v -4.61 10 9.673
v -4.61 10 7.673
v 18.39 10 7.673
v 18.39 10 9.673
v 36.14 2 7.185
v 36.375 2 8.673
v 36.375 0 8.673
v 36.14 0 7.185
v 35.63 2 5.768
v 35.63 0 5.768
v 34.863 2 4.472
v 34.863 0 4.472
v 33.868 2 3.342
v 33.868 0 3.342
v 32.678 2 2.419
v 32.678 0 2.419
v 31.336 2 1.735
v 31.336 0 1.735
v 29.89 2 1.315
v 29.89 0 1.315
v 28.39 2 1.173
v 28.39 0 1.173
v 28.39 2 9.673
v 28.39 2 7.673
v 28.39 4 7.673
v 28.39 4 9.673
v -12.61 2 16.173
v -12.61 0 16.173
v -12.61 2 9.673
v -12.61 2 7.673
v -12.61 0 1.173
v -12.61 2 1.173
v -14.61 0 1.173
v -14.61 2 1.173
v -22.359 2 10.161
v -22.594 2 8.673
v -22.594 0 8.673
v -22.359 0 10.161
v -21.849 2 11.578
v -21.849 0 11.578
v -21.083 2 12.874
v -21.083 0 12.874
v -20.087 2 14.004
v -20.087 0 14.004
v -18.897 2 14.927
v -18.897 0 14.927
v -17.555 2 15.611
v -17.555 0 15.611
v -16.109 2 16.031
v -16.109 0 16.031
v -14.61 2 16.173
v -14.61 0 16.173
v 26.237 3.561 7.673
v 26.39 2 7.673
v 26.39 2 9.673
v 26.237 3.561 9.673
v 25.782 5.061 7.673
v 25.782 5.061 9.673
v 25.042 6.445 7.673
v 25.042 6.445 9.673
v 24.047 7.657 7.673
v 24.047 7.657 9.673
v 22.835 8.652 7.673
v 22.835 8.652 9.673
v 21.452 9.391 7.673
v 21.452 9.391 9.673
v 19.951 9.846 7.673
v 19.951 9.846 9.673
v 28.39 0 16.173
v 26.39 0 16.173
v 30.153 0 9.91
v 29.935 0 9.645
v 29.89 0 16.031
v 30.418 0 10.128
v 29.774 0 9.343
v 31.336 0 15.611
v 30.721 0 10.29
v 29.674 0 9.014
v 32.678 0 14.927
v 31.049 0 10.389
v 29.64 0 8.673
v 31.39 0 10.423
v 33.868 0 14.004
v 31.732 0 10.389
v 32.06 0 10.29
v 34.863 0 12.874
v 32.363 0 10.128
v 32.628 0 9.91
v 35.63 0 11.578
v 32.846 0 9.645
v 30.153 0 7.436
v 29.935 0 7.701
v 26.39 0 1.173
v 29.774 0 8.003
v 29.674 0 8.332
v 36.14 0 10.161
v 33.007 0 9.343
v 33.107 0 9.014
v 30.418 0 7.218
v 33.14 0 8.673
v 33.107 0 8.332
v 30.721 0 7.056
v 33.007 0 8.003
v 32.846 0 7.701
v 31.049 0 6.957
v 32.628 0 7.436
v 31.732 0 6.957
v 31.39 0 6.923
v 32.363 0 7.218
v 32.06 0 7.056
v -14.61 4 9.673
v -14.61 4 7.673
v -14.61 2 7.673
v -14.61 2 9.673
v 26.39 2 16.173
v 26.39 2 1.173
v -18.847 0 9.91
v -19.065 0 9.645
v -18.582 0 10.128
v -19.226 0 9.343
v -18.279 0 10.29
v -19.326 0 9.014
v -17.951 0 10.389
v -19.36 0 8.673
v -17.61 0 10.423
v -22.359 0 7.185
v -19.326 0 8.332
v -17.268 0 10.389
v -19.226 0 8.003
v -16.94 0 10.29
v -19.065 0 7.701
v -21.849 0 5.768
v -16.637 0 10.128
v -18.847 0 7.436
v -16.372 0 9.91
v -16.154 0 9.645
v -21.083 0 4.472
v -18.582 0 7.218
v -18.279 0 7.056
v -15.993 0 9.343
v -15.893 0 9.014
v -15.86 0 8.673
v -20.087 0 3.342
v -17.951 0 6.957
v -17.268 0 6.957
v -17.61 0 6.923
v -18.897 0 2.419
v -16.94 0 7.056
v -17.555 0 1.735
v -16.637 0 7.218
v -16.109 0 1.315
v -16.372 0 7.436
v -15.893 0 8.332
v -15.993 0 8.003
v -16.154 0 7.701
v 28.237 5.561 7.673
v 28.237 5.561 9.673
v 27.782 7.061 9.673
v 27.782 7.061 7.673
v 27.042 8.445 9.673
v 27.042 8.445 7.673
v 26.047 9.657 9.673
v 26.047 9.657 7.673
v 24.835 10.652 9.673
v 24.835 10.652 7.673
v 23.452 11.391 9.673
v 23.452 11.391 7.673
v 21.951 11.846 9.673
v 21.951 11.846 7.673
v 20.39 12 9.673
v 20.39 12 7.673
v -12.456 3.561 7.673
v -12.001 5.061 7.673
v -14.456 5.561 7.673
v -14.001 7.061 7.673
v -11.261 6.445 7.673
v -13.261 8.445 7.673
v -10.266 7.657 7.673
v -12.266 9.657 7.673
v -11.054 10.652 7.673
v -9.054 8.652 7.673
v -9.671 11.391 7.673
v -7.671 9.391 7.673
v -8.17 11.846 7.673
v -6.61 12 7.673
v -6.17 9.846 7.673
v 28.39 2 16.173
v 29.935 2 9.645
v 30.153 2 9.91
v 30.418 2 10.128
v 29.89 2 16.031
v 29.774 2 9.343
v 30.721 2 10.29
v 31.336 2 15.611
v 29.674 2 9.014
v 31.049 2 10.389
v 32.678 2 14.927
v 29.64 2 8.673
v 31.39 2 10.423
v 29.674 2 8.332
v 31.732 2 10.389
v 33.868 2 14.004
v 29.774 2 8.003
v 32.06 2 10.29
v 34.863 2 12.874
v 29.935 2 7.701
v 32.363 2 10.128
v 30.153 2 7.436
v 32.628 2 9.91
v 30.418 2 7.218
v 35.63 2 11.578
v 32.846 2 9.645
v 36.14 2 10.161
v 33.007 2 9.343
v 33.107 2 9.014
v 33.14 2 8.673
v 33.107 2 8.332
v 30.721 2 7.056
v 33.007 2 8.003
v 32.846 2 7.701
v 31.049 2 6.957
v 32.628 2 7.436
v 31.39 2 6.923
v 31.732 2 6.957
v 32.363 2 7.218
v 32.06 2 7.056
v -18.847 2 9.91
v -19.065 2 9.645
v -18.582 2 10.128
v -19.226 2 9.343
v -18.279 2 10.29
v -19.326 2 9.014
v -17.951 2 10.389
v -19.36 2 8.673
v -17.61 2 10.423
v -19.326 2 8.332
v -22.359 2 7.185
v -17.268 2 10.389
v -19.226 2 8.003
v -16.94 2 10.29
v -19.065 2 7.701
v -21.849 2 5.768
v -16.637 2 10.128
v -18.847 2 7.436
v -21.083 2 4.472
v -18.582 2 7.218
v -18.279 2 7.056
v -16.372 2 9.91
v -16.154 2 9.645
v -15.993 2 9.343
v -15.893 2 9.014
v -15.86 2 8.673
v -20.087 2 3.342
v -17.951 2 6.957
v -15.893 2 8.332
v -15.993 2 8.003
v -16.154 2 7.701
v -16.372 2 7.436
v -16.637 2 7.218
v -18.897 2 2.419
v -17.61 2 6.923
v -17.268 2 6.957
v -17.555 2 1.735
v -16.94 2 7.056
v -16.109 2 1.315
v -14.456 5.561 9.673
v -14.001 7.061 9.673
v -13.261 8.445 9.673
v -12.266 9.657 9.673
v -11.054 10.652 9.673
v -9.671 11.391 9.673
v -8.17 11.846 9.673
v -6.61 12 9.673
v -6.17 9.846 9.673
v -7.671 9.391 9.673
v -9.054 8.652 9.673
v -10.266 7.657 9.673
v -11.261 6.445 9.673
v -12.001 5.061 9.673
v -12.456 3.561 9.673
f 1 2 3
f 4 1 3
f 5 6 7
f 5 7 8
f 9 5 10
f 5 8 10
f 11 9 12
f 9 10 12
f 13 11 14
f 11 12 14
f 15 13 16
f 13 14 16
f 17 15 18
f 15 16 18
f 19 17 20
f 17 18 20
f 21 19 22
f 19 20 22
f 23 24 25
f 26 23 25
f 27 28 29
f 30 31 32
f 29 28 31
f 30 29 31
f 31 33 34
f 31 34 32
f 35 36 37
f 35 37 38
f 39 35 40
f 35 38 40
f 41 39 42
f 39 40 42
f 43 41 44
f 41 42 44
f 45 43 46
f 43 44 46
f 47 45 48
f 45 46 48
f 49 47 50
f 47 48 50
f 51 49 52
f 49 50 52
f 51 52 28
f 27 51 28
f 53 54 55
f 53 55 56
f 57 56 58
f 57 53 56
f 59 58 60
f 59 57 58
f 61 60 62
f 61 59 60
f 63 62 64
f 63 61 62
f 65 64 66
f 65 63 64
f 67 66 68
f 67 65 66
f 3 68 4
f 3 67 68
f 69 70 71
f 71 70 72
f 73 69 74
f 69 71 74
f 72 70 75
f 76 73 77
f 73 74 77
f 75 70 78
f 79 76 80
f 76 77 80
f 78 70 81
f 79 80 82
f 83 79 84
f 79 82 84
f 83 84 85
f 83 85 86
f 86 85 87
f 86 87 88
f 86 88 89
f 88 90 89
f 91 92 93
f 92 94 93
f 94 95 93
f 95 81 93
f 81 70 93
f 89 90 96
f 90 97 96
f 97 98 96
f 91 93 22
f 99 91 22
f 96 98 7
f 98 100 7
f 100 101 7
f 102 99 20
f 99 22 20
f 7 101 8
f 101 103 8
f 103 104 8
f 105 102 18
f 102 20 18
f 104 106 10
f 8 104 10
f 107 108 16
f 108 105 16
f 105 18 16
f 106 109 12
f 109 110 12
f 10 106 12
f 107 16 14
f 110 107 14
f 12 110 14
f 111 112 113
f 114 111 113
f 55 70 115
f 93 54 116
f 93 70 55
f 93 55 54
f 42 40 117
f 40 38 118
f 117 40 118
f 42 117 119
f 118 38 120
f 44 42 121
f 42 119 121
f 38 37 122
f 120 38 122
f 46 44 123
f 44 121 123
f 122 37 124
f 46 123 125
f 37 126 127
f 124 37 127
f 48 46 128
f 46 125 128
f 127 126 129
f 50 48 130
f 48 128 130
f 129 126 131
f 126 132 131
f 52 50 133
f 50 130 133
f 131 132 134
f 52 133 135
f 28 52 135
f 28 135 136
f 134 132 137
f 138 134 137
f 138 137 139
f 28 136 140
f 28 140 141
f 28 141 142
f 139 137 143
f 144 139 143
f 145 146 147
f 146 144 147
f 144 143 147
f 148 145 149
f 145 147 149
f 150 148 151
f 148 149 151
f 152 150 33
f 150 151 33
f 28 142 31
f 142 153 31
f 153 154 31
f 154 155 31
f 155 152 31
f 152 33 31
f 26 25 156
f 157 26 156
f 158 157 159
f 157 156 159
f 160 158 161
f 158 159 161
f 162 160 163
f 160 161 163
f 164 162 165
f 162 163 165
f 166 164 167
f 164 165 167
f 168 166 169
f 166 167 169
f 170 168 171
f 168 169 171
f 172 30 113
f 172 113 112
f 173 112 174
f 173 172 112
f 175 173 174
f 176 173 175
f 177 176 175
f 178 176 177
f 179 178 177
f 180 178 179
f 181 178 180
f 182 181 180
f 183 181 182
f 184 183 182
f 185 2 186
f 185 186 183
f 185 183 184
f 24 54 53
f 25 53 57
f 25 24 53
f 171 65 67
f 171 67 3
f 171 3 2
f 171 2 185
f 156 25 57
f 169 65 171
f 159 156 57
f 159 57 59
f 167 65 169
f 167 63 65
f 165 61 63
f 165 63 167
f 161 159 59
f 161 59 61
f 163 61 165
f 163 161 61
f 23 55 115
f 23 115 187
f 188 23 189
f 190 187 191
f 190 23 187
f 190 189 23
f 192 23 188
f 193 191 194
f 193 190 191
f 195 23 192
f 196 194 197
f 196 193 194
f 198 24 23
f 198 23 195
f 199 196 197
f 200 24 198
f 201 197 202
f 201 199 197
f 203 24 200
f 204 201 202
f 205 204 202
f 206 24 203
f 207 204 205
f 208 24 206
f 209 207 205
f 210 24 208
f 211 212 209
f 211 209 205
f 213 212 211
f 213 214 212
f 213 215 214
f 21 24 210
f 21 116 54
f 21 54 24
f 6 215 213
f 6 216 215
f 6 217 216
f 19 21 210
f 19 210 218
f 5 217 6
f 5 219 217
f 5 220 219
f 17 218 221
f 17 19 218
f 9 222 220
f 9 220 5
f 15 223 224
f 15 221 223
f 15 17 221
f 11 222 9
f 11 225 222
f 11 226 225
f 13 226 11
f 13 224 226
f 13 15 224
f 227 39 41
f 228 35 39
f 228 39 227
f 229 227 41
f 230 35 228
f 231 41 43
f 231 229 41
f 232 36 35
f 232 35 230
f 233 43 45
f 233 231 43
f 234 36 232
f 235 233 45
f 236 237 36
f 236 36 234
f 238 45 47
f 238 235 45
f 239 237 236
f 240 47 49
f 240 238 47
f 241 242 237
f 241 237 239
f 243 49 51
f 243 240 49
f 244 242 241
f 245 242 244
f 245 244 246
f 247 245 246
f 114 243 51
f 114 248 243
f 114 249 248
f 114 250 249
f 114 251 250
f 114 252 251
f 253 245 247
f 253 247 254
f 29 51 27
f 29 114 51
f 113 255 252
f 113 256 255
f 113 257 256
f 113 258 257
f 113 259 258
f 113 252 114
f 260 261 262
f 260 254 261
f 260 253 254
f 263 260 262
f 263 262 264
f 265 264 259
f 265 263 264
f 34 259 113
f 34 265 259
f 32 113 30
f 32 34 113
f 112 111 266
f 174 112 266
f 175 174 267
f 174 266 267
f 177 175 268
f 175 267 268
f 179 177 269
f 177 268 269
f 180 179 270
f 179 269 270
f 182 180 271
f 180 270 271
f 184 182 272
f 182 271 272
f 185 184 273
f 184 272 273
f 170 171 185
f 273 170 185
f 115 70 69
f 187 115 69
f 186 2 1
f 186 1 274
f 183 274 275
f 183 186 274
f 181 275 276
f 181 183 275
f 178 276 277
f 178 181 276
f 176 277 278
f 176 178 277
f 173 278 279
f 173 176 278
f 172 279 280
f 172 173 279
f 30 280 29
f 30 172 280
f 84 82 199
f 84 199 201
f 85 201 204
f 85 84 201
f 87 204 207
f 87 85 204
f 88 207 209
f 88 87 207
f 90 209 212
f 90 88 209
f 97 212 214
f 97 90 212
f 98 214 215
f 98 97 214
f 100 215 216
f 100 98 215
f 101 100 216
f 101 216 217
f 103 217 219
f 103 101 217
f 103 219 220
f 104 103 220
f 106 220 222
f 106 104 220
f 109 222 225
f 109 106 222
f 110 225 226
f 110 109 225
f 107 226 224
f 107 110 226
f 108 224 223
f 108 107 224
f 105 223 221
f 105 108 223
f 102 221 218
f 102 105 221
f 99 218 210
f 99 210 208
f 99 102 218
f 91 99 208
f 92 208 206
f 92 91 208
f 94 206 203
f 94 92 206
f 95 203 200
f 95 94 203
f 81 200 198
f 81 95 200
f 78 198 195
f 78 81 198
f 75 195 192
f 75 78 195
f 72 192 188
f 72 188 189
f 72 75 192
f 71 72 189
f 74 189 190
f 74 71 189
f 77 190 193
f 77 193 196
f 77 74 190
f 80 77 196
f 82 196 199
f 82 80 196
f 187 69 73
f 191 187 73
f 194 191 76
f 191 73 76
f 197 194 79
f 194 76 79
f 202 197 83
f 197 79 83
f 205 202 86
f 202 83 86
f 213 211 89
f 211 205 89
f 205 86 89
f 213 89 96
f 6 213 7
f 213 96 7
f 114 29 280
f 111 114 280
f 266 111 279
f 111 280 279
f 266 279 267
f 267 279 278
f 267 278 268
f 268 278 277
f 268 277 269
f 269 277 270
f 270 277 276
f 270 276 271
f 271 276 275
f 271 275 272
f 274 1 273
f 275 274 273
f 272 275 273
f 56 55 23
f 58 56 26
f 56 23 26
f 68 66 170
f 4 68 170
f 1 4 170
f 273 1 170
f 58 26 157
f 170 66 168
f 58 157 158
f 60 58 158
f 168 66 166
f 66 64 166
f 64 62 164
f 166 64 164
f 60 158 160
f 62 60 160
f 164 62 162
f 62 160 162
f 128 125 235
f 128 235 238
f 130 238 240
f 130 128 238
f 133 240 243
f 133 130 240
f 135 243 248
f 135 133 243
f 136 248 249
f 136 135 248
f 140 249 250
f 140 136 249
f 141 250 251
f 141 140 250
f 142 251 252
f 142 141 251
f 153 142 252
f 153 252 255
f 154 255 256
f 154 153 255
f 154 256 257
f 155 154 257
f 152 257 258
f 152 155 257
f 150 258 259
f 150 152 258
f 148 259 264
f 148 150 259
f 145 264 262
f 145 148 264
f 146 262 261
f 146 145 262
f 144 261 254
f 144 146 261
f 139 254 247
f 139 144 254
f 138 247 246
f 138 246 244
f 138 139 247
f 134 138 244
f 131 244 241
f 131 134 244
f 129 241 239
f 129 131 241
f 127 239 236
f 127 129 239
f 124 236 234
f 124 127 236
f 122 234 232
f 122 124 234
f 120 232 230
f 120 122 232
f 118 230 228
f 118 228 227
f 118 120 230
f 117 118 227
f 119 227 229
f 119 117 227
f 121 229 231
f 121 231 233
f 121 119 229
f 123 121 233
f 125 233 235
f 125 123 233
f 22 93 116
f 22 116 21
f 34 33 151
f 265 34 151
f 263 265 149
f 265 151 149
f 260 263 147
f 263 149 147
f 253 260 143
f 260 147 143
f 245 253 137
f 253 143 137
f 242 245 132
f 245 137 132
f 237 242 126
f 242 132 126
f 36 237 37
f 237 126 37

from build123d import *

# Parameters (mm, degrees)
SKETCH3_W                = 10
SKETCH3_H                = 15
SKETCH3_R                = 1.75
BOSS_EXTRUDE1_DEPTH      = 2
BOSS_EXTRUDE1_2_DEPTH    = 2
BOSS_EXTRUDE2_DEPTH      = 1
BOSS_EXTRUDE2_DEPTH_BACK = 1
FILLET1_R                = 8


with BuildPart() as part:
    # Sketch3 → Boss-Extrude1 (new body)
    with BuildSketch(Plane(origin=(0, 0, 0), x_dir=(1, 0, 0), z_dir=(0, 1, 0))):
        with Locations((-17.609522653, -8.672957347)):
            Rectangle(SKETCH3_W, SKETCH3_H)
        with Locations(Location((-17.609522653, -8.672957347, 0), (0, 0, 270))):
            Circle(SKETCH3_R, mode=Mode.SUBTRACT)
    extrude(amount=BOSS_EXTRUDE1_DEPTH)



with BuildPart() as body_2:
    # Sketch3 → Boss-Extrude1 2 (new body)
    with BuildSketch(Plane(origin=(0, 0, 0), x_dir=(1, 0, 0), z_dir=(0, 1, 0))):
        with Locations((31.390477347, -8.672957347)):
            Rectangle(SKETCH3_W, SKETCH3_H)
        with Locations(Location((31.390477347, -8.672957347, 0), (0, 0, 270))):
            Circle(SKETCH3_R, mode=Mode.SUBTRACT)
    extrude(amount=BOSS_EXTRUDE1_2_DEPTH)


with BuildPart() as part_1:
    add(part.part)

    add(body_2.part)  # Boss-Extrude2 merges body 2
    # Sketch4 → Boss-Extrude2 (add, two sides: drawn at the far end of the back side and taken through both)
    with BuildSketch(Plane.XY.offset(8.672957347).offset(-BOSS_EXTRUDE2_DEPTH_BACK)):
        Polygon((-12.609522653, 2), (-12.609522653, 10), (26.390477347, 10), (26.390477347, 2), (28.390477347, 2), (28.390477347, 12), (-14.609522653, 12), (-14.609522653, 2), align=None)
    extrude(amount=BOSS_EXTRUDE2_DEPTH + BOSS_EXTRUDE2_DEPTH_BACK)

    # Fillet1
    # the kernel refuses this fillet: 8 mm, written as the material it adds along each edge
    with BuildSketch(Plane(origin=(26.390477347, 10, 7.672957347), x_dir=(0, -1, 0), z_dir=(0, 0, 1)), Plane(origin=(-12.609522653, 10, 7.672957347), x_dir=(1, 0, 0), z_dir=(0, 0, 1))) as fillet1_piece_1:
        with BuildLine():
            CenterArc((FILLET1_R, -FILLET1_R), FILLET1_R, 90, 90)
            Line((0, -FILLET1_R), (0, 0))
            Line((0, 0), (FILLET1_R, 0))
        make_face()
    extrude(amount=2)
    # the kernel refuses this fillet: 8 mm, written as the material it takes off along each edge
    with BuildSketch(Plane(origin=(-22.609522653, -20, 1.172957347), x_dir=(0, 0, 1), z_dir=(0, 1, 0)), Plane(origin=(36.390477347, -20, 1.172957347), x_dir=(-1, 0, 0), z_dir=(0, 1, 0)), Plane(origin=(36.390477347, -20, 16.172957347), x_dir=(0, 0, -1), z_dir=(0, 1, 0)), Plane(origin=(-14.609522653, 12, 29.672957347), x_dir=(1, 0, 0), z_dir=(0, 0, -1))) as fillet1_2_piece_1:
        with BuildLine():
            CenterArc((FILLET1_R, FILLET1_R), FILLET1_R, 180, 90)
            Line((0, FILLET1_R), (0, 0))
            Line((0, 0), (FILLET1_R, 0))
        make_face()
    extrude(amount=42, mode=Mode.SUBTRACT)
    with BuildSketch(Plane(origin=(-22.609522653, -20, 16.172957347), x_dir=(0, 0, -1), z_dir=(0, 1, 0)), Plane(origin=(28.390477347, 12, -12.327042653), x_dir=(0, -1, 0), z_dir=(0, 0, 1))) as fillet1_2_piece_2:
        with BuildLine():
            CenterArc((FILLET1_R, -FILLET1_R), FILLET1_R, 90, 90)
            Line((0, -FILLET1_R), (0, 0))
            Line((0, 0), (FILLET1_R, 0))
        make_face()
    extrude(amount=42, mode=Mode.SUBTRACT)


solid = part_1.part
